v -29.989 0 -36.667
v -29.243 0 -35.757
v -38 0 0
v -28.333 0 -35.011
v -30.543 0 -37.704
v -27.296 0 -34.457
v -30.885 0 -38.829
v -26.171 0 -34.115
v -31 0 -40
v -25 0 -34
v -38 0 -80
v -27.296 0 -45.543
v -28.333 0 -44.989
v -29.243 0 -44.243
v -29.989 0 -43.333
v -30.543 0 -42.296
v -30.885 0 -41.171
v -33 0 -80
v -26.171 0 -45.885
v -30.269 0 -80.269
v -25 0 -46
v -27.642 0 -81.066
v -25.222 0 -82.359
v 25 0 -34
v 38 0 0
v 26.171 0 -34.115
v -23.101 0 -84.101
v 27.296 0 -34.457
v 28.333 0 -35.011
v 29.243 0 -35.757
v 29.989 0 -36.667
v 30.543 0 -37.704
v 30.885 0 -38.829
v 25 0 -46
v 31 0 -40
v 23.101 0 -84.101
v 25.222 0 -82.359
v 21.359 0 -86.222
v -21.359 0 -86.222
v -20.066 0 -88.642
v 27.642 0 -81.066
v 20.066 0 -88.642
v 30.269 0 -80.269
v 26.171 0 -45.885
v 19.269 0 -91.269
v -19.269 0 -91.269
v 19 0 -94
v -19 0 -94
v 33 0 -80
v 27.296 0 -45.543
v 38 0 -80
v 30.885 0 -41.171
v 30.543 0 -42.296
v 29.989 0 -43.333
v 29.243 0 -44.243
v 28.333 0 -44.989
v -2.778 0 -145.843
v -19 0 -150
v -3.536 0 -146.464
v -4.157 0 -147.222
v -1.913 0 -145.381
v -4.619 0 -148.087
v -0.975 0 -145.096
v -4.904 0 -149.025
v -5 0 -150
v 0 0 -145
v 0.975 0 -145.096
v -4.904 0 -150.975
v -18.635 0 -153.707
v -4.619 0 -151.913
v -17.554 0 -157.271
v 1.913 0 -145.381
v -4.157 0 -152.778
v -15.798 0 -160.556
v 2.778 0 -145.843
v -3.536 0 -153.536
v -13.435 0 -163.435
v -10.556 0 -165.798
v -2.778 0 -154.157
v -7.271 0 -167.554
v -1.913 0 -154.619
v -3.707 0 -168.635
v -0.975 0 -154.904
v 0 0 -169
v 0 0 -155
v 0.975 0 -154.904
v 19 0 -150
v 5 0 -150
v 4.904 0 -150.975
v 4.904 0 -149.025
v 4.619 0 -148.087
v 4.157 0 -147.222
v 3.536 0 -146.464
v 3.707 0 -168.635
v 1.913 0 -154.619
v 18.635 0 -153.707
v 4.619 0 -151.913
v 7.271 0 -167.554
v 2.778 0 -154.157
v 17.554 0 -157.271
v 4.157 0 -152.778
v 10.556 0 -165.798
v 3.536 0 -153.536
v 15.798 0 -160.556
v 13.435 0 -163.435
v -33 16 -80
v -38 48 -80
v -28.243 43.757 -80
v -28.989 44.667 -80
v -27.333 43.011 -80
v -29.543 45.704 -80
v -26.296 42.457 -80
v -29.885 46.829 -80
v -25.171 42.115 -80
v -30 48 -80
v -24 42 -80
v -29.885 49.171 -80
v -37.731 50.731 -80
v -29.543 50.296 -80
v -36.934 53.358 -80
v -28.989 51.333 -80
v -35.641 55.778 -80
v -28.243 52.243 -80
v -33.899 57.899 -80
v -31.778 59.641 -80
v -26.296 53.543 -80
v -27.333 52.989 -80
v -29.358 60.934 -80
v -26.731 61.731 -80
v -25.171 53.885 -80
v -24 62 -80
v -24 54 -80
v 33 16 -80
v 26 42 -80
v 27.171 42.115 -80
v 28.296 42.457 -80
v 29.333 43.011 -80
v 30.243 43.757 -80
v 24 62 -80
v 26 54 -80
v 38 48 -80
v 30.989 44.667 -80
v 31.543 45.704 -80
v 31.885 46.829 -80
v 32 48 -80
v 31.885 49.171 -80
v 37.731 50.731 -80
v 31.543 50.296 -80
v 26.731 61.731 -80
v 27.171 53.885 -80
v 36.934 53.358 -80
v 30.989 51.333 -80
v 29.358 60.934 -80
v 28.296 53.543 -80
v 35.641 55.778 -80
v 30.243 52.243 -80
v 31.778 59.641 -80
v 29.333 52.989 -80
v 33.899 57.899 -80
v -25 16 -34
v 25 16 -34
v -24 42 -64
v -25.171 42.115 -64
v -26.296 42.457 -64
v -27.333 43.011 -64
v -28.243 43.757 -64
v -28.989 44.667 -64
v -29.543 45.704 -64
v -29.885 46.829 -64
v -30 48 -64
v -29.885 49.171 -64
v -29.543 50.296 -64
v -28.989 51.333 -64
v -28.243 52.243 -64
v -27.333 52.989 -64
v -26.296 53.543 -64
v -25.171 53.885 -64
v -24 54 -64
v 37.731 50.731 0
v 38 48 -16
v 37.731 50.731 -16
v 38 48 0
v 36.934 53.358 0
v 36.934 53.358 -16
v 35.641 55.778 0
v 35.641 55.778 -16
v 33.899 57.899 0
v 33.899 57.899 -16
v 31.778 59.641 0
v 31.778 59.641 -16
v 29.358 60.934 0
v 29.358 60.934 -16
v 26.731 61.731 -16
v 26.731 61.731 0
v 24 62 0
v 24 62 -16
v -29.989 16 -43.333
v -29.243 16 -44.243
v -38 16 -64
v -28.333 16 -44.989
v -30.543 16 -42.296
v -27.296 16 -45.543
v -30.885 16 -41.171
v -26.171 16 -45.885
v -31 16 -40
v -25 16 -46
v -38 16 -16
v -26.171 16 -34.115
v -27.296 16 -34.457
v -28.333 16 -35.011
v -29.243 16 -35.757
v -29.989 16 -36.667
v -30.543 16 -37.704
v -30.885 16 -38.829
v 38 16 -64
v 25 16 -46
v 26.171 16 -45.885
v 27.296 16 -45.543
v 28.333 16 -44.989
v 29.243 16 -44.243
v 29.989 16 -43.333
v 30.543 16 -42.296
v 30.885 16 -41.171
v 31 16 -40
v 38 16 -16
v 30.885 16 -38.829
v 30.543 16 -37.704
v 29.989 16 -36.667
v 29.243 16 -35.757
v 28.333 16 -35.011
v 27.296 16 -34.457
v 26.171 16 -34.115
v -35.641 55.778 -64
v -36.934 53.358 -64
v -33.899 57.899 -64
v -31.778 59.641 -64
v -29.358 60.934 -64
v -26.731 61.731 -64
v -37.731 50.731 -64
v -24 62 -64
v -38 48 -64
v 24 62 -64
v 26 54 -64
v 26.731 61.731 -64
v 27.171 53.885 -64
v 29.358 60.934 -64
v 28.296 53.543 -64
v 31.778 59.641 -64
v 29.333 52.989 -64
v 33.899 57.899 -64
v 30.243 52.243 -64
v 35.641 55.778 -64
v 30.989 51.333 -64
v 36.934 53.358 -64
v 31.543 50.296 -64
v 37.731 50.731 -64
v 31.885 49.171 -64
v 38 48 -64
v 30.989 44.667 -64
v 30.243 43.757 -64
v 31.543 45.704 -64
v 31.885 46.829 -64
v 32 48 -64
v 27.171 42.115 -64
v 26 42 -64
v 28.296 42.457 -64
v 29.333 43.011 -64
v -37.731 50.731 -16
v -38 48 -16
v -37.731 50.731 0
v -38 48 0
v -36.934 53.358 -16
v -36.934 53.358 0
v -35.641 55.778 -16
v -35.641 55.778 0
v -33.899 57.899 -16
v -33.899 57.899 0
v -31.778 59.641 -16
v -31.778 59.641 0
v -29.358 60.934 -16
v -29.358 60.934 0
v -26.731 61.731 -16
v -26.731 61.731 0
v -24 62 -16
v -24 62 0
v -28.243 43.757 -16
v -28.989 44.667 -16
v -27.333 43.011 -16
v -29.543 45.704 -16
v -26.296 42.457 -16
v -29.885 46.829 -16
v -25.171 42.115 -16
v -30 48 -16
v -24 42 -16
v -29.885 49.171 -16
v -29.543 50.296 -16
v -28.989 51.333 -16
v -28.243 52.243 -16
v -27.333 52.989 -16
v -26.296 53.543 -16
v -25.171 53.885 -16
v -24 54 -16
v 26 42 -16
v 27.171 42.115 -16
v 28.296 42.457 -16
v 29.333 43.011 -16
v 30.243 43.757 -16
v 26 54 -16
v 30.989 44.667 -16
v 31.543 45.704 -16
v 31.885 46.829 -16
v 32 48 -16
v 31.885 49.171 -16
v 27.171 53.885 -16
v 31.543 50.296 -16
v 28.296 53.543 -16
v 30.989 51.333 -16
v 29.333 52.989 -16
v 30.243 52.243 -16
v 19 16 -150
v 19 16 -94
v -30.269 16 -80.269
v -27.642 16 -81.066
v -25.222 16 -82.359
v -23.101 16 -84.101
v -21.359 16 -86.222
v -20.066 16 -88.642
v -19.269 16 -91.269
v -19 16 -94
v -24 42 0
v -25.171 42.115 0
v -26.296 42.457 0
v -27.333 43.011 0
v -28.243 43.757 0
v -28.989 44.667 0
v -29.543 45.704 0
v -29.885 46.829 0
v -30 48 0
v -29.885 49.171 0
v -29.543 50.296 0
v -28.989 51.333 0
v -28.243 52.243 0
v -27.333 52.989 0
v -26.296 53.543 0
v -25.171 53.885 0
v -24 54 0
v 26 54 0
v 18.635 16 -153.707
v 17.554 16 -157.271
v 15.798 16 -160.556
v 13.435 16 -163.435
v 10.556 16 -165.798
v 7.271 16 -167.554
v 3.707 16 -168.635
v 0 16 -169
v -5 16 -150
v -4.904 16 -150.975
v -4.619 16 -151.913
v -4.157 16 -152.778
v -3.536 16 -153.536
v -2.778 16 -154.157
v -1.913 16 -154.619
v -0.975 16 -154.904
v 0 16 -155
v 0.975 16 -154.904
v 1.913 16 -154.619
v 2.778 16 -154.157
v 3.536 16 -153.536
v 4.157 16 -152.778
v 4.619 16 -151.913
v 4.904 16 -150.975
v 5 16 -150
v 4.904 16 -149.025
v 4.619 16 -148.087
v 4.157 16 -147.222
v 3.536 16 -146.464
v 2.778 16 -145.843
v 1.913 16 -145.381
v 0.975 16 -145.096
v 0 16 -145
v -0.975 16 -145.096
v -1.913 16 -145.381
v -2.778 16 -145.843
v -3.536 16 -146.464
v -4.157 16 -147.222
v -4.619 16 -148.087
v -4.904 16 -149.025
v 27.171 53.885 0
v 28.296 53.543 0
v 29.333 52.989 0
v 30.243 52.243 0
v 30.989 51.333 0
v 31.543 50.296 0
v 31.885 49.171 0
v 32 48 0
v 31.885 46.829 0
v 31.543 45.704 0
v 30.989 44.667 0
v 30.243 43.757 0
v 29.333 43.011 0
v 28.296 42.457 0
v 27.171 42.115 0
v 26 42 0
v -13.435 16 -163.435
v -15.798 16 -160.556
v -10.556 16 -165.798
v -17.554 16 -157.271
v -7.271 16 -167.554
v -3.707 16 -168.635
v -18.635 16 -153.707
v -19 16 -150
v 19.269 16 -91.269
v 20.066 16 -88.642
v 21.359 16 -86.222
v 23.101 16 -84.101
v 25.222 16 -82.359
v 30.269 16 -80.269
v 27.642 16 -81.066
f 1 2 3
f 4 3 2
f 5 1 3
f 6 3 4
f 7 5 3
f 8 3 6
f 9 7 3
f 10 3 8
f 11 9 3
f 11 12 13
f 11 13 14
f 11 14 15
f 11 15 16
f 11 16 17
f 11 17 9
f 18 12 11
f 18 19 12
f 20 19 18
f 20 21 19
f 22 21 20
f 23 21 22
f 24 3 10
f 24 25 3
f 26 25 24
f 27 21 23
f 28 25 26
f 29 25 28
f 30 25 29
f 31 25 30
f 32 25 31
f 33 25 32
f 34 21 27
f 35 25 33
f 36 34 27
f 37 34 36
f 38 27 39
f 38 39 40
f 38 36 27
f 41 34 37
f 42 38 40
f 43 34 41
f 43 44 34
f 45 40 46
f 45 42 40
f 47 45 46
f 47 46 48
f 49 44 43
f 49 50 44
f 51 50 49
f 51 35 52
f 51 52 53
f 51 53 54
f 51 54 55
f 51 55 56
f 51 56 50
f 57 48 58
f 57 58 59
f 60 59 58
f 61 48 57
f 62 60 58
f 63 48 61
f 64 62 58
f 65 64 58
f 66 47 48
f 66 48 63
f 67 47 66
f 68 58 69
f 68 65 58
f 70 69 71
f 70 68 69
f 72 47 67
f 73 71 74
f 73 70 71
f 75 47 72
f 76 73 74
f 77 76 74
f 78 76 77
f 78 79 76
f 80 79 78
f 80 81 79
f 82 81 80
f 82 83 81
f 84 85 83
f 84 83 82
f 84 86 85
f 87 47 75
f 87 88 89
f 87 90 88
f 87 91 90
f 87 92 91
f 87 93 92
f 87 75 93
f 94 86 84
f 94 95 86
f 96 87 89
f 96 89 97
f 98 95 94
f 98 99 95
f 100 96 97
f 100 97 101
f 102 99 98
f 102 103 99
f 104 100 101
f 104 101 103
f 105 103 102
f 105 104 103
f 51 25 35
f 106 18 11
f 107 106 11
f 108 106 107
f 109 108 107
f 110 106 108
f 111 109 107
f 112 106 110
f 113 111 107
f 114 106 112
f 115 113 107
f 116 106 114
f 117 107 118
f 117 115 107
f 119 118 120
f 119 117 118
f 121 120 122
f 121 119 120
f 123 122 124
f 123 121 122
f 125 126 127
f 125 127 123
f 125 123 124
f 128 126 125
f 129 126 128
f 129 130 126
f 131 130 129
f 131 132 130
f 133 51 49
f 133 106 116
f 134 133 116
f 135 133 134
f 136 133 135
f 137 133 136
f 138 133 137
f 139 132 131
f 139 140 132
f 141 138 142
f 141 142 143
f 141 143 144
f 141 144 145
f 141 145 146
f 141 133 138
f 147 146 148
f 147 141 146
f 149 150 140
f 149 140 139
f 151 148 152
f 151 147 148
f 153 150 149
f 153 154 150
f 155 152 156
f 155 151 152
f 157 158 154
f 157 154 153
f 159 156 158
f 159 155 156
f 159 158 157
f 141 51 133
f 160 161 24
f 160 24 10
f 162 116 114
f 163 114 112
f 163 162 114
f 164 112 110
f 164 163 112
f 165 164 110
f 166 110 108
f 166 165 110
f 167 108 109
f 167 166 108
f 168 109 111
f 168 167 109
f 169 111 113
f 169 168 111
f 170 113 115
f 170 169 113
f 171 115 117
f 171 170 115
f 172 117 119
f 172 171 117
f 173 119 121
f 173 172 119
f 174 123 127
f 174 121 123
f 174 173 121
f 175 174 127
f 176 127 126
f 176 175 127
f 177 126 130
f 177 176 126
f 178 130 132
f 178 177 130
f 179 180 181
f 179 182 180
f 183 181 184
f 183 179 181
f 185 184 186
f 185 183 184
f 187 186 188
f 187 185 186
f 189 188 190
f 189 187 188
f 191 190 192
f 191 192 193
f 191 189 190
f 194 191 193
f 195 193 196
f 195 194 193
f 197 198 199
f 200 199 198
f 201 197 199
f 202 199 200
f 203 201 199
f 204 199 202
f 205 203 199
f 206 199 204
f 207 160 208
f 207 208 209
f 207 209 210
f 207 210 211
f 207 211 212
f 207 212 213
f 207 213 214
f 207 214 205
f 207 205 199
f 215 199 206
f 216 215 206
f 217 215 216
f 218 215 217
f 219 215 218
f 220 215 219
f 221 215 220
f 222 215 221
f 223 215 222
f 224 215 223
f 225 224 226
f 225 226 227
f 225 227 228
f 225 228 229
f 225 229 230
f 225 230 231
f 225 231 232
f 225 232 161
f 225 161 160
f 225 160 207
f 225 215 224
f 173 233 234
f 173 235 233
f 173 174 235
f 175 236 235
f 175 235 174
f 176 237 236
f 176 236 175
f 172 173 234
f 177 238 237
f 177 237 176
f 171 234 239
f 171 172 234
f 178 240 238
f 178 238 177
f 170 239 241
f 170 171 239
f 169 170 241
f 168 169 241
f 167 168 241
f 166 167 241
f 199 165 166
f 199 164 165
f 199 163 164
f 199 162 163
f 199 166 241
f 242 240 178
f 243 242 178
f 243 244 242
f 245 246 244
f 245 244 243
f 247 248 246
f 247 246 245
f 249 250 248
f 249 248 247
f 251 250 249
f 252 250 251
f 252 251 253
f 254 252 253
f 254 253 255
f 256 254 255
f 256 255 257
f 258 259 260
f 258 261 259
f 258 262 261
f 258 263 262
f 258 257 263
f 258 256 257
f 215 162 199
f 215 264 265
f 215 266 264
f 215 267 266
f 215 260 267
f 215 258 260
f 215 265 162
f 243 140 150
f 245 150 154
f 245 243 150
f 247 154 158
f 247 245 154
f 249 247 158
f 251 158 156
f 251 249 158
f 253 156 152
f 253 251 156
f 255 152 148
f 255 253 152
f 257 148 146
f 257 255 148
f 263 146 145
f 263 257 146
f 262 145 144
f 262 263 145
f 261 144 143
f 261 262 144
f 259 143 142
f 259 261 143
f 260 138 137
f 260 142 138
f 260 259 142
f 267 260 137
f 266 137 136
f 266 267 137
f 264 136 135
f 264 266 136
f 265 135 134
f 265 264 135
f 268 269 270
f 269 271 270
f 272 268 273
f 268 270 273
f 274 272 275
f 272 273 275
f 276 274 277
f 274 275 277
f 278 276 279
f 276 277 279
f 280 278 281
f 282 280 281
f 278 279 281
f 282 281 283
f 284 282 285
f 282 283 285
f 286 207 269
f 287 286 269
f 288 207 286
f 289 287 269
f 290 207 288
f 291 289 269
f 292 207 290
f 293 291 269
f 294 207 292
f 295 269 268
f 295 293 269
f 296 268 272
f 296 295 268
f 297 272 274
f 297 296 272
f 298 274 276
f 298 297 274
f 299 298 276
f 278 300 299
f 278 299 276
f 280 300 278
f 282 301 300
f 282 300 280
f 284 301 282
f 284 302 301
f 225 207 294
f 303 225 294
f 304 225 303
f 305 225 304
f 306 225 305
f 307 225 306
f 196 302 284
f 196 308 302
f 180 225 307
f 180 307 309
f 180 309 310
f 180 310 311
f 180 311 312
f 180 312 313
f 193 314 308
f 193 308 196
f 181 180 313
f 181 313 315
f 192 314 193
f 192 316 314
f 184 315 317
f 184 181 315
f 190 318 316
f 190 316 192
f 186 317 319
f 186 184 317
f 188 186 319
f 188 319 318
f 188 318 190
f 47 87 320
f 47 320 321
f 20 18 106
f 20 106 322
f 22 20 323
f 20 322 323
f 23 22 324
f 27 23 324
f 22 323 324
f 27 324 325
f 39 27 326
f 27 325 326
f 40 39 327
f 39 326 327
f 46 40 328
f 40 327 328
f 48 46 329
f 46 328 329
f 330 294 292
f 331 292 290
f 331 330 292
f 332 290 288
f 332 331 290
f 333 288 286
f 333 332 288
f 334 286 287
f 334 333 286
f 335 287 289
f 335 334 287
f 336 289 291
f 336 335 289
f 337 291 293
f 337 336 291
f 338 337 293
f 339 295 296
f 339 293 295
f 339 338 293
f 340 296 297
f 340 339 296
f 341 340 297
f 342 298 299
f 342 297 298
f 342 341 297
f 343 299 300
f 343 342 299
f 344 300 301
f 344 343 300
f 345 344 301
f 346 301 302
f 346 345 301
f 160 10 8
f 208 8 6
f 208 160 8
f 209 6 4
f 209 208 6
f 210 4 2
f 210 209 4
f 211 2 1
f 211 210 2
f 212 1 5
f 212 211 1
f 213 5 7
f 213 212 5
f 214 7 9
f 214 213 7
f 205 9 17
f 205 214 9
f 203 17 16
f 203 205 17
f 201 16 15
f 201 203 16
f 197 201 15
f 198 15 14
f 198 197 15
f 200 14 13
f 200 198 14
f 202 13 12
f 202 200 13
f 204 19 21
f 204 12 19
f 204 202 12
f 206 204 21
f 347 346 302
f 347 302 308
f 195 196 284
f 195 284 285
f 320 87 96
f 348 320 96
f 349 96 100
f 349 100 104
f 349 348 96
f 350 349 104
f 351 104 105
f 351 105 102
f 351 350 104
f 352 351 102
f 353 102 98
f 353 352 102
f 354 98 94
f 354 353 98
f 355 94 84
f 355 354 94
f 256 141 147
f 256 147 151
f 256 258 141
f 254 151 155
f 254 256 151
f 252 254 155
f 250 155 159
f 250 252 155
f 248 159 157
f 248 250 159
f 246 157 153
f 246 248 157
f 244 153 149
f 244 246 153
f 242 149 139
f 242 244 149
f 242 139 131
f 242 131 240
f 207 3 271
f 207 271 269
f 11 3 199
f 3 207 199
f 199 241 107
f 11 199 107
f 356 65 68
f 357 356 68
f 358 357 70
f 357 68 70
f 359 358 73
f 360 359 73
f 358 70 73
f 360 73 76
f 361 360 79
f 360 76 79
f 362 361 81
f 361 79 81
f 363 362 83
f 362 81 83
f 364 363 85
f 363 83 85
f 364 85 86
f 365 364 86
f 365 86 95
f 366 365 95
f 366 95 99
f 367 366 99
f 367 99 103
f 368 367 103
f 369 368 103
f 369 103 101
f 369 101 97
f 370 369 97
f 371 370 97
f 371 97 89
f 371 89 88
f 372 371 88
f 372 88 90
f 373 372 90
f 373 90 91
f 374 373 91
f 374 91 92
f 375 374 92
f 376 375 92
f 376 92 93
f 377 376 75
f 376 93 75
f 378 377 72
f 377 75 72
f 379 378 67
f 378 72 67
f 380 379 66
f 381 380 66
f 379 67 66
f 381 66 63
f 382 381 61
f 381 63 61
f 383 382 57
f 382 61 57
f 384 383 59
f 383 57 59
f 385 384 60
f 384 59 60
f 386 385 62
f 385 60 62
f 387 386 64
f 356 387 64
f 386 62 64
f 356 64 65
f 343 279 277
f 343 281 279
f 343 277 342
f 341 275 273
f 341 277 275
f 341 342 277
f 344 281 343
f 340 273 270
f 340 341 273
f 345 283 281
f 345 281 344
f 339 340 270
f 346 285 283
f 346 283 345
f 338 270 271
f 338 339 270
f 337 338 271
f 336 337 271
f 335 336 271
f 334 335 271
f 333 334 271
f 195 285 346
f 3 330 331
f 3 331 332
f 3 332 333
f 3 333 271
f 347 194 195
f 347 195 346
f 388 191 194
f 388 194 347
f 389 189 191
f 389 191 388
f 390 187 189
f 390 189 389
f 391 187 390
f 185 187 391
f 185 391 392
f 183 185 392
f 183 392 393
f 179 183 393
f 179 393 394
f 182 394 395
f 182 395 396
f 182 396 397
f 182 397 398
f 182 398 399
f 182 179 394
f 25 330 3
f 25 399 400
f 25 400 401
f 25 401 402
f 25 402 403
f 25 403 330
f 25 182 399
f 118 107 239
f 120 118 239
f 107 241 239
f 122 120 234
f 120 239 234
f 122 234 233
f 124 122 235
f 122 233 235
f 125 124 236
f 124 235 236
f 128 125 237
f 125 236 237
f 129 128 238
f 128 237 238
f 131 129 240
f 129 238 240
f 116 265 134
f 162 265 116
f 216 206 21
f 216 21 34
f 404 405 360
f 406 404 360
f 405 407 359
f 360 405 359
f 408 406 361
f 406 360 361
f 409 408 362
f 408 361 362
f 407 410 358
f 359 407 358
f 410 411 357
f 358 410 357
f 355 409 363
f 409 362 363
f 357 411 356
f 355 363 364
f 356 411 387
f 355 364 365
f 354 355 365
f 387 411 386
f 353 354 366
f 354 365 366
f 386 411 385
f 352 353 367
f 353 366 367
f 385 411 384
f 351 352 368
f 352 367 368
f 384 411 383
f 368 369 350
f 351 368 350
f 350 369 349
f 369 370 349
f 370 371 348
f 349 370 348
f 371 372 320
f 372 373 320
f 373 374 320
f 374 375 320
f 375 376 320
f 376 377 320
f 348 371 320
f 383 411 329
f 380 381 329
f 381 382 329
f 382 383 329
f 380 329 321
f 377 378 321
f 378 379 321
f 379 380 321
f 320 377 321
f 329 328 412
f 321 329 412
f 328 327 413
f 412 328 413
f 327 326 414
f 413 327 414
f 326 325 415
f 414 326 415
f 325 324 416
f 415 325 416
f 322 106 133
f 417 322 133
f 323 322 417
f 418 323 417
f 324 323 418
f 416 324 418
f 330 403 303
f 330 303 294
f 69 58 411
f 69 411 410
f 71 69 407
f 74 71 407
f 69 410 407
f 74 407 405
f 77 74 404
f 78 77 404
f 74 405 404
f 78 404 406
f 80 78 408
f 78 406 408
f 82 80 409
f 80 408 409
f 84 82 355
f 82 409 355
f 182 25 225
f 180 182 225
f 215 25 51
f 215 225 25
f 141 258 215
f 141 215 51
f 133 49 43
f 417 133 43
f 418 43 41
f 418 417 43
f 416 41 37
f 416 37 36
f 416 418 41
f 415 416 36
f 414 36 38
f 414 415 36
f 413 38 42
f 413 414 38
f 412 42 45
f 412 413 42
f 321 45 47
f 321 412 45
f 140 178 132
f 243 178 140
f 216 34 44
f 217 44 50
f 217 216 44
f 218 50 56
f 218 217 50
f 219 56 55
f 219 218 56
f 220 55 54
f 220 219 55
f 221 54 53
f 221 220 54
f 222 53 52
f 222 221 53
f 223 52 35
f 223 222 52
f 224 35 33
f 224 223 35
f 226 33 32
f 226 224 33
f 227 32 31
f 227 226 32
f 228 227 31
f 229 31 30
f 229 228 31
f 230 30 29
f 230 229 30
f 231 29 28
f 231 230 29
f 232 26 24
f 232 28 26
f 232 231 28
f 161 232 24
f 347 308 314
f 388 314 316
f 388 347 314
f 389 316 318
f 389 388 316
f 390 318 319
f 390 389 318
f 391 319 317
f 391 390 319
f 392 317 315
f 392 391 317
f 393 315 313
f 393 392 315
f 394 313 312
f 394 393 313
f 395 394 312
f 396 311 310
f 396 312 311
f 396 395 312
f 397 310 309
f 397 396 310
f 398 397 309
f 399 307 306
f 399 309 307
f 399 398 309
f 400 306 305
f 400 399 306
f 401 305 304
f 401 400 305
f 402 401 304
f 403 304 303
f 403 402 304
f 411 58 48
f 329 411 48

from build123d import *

# Parameters (mm, degrees)
ESTRUSIONE_ESTRUSIONE1_DEPTH = 38
SCHIZZO3_W                   = 38
SCHIZZO3_H                   = 89
ESTRUSIONE_ESTRUSIONE2_DEPTH = 16
RACCORDO1_R                  = 19
RACCORDO2_R                  = 14
TAGLIO_ESTRUSIONE1_REACH     = 181.223
TAGLIO_ESTRUSIONE2_DEPTH     = 184.980977278
FORO_10_0_10_2_D             = 10
RACCORDO3_R                  = 14


with BuildPart() as part:
    # Schizzo2 → Estrusione-Estrusione1 (new, symmetric)
    with BuildSketch(Plane(origin=(0, 0, 0), x_dir=(0, 0, -1), z_dir=(1, 0, 0))):
        Polygon((0, 62), (0, 0), (80, 0), (80, 62), (64, 62), (64, 16), (16, 16), (16, 62), align=None)
    extrude(amount=ESTRUSIONE_ESTRUSIONE1_DEPTH, both=True)

    # Schizzo3 → Estrusione-Estrusione2 (add)
    with BuildSketch(Plane.XZ):
        with Locations((0, -124.5)):
            Rectangle(SCHIZZO3_W, SCHIZZO3_H)
    extrude(amount=-ESTRUSIONE_ESTRUSIONE2_DEPTH)

    # Raccordo1
    raccordo1_edges = [part.edges().sort_by_distance(p)[0] for p in [
        (19, 8, -169),
        (-19, 8, -169),
    ]]
    fillet(raccordo1_edges, radius=RACCORDO1_R - 0.0001)  # a hair under: the kernel refuses the full size

    # Raccordo2
    raccordo2_edges = [part.edges().sort_by_distance(p)[0] for p in [
        (-38, 62, -8),
        (38, 62, -72),
        (38, 62, -8),
        (-38, 62, -72),
    ]]
    fillet(raccordo2_edges, radius=RACCORDO2_R)

    # Schizzo4 → Taglio-Estrusione1 (cut, up to next)
    with BuildSketch(Plane(origin=(0, 16, 0), x_dir=(1, 0, 0), z_dir=(0, 1, 0)), mode=Mode.PRIVATE) as taglio_estrusione1_sk1:
        with BuildLine():
            Line((25, 34), (-25, 34))
            ThreePointArc((-25, 34), (-31, 40), (-25, 46))
            Line((-25, 46), (25, 46))
            ThreePointArc((25, 46), (31, 40), (25, 34))
        make_face()
    taglio_estrusione1_tool1 = extrude(taglio_estrusione1_sk1.sketch, amount=-TAGLIO_ESTRUSIONE1_REACH, mode=Mode.PRIVATE) & part.part
    add(taglio_estrusione1_tool1.solids().sort_by_distance((0, 16, -40))[0], mode=Mode.SUBTRACT)

    # Schizzo5 → Taglio-Estrusione2 (cut, through all)
    with BuildSketch(Plane.XY):
        with BuildLine():
            Line((-24, 54), (26, 54))
            ThreePointArc((26, 54), (32, 48), (26, 42))
            Line((26, 42), (-24, 42))
            ThreePointArc((-24, 42), (-30, 48), (-24, 54))
        make_face()
    extrude(amount=-TAGLIO_ESTRUSIONE2_DEPTH, mode=Mode.SUBTRACT)

    # Foro Ø10.0 (10)-2 (through all)
    with Locations(Plane(origin=(0, 16, 0), x_dir=(1, 0, 0), z_dir=(0, 1, 0))):
        with Locations((0, 150)):
            Hole(FORO_10_0_10_2_D / 2)

    # Raccordo3
    raccordo3_edges = [part.edges().sort_by_distance(p)[0] for p in [
        (-19, 8, -80),
        (19, 8, -80),
    ]]
    fillet(raccordo3_edges, radius=RACCORDO3_R)


solid = part.part
